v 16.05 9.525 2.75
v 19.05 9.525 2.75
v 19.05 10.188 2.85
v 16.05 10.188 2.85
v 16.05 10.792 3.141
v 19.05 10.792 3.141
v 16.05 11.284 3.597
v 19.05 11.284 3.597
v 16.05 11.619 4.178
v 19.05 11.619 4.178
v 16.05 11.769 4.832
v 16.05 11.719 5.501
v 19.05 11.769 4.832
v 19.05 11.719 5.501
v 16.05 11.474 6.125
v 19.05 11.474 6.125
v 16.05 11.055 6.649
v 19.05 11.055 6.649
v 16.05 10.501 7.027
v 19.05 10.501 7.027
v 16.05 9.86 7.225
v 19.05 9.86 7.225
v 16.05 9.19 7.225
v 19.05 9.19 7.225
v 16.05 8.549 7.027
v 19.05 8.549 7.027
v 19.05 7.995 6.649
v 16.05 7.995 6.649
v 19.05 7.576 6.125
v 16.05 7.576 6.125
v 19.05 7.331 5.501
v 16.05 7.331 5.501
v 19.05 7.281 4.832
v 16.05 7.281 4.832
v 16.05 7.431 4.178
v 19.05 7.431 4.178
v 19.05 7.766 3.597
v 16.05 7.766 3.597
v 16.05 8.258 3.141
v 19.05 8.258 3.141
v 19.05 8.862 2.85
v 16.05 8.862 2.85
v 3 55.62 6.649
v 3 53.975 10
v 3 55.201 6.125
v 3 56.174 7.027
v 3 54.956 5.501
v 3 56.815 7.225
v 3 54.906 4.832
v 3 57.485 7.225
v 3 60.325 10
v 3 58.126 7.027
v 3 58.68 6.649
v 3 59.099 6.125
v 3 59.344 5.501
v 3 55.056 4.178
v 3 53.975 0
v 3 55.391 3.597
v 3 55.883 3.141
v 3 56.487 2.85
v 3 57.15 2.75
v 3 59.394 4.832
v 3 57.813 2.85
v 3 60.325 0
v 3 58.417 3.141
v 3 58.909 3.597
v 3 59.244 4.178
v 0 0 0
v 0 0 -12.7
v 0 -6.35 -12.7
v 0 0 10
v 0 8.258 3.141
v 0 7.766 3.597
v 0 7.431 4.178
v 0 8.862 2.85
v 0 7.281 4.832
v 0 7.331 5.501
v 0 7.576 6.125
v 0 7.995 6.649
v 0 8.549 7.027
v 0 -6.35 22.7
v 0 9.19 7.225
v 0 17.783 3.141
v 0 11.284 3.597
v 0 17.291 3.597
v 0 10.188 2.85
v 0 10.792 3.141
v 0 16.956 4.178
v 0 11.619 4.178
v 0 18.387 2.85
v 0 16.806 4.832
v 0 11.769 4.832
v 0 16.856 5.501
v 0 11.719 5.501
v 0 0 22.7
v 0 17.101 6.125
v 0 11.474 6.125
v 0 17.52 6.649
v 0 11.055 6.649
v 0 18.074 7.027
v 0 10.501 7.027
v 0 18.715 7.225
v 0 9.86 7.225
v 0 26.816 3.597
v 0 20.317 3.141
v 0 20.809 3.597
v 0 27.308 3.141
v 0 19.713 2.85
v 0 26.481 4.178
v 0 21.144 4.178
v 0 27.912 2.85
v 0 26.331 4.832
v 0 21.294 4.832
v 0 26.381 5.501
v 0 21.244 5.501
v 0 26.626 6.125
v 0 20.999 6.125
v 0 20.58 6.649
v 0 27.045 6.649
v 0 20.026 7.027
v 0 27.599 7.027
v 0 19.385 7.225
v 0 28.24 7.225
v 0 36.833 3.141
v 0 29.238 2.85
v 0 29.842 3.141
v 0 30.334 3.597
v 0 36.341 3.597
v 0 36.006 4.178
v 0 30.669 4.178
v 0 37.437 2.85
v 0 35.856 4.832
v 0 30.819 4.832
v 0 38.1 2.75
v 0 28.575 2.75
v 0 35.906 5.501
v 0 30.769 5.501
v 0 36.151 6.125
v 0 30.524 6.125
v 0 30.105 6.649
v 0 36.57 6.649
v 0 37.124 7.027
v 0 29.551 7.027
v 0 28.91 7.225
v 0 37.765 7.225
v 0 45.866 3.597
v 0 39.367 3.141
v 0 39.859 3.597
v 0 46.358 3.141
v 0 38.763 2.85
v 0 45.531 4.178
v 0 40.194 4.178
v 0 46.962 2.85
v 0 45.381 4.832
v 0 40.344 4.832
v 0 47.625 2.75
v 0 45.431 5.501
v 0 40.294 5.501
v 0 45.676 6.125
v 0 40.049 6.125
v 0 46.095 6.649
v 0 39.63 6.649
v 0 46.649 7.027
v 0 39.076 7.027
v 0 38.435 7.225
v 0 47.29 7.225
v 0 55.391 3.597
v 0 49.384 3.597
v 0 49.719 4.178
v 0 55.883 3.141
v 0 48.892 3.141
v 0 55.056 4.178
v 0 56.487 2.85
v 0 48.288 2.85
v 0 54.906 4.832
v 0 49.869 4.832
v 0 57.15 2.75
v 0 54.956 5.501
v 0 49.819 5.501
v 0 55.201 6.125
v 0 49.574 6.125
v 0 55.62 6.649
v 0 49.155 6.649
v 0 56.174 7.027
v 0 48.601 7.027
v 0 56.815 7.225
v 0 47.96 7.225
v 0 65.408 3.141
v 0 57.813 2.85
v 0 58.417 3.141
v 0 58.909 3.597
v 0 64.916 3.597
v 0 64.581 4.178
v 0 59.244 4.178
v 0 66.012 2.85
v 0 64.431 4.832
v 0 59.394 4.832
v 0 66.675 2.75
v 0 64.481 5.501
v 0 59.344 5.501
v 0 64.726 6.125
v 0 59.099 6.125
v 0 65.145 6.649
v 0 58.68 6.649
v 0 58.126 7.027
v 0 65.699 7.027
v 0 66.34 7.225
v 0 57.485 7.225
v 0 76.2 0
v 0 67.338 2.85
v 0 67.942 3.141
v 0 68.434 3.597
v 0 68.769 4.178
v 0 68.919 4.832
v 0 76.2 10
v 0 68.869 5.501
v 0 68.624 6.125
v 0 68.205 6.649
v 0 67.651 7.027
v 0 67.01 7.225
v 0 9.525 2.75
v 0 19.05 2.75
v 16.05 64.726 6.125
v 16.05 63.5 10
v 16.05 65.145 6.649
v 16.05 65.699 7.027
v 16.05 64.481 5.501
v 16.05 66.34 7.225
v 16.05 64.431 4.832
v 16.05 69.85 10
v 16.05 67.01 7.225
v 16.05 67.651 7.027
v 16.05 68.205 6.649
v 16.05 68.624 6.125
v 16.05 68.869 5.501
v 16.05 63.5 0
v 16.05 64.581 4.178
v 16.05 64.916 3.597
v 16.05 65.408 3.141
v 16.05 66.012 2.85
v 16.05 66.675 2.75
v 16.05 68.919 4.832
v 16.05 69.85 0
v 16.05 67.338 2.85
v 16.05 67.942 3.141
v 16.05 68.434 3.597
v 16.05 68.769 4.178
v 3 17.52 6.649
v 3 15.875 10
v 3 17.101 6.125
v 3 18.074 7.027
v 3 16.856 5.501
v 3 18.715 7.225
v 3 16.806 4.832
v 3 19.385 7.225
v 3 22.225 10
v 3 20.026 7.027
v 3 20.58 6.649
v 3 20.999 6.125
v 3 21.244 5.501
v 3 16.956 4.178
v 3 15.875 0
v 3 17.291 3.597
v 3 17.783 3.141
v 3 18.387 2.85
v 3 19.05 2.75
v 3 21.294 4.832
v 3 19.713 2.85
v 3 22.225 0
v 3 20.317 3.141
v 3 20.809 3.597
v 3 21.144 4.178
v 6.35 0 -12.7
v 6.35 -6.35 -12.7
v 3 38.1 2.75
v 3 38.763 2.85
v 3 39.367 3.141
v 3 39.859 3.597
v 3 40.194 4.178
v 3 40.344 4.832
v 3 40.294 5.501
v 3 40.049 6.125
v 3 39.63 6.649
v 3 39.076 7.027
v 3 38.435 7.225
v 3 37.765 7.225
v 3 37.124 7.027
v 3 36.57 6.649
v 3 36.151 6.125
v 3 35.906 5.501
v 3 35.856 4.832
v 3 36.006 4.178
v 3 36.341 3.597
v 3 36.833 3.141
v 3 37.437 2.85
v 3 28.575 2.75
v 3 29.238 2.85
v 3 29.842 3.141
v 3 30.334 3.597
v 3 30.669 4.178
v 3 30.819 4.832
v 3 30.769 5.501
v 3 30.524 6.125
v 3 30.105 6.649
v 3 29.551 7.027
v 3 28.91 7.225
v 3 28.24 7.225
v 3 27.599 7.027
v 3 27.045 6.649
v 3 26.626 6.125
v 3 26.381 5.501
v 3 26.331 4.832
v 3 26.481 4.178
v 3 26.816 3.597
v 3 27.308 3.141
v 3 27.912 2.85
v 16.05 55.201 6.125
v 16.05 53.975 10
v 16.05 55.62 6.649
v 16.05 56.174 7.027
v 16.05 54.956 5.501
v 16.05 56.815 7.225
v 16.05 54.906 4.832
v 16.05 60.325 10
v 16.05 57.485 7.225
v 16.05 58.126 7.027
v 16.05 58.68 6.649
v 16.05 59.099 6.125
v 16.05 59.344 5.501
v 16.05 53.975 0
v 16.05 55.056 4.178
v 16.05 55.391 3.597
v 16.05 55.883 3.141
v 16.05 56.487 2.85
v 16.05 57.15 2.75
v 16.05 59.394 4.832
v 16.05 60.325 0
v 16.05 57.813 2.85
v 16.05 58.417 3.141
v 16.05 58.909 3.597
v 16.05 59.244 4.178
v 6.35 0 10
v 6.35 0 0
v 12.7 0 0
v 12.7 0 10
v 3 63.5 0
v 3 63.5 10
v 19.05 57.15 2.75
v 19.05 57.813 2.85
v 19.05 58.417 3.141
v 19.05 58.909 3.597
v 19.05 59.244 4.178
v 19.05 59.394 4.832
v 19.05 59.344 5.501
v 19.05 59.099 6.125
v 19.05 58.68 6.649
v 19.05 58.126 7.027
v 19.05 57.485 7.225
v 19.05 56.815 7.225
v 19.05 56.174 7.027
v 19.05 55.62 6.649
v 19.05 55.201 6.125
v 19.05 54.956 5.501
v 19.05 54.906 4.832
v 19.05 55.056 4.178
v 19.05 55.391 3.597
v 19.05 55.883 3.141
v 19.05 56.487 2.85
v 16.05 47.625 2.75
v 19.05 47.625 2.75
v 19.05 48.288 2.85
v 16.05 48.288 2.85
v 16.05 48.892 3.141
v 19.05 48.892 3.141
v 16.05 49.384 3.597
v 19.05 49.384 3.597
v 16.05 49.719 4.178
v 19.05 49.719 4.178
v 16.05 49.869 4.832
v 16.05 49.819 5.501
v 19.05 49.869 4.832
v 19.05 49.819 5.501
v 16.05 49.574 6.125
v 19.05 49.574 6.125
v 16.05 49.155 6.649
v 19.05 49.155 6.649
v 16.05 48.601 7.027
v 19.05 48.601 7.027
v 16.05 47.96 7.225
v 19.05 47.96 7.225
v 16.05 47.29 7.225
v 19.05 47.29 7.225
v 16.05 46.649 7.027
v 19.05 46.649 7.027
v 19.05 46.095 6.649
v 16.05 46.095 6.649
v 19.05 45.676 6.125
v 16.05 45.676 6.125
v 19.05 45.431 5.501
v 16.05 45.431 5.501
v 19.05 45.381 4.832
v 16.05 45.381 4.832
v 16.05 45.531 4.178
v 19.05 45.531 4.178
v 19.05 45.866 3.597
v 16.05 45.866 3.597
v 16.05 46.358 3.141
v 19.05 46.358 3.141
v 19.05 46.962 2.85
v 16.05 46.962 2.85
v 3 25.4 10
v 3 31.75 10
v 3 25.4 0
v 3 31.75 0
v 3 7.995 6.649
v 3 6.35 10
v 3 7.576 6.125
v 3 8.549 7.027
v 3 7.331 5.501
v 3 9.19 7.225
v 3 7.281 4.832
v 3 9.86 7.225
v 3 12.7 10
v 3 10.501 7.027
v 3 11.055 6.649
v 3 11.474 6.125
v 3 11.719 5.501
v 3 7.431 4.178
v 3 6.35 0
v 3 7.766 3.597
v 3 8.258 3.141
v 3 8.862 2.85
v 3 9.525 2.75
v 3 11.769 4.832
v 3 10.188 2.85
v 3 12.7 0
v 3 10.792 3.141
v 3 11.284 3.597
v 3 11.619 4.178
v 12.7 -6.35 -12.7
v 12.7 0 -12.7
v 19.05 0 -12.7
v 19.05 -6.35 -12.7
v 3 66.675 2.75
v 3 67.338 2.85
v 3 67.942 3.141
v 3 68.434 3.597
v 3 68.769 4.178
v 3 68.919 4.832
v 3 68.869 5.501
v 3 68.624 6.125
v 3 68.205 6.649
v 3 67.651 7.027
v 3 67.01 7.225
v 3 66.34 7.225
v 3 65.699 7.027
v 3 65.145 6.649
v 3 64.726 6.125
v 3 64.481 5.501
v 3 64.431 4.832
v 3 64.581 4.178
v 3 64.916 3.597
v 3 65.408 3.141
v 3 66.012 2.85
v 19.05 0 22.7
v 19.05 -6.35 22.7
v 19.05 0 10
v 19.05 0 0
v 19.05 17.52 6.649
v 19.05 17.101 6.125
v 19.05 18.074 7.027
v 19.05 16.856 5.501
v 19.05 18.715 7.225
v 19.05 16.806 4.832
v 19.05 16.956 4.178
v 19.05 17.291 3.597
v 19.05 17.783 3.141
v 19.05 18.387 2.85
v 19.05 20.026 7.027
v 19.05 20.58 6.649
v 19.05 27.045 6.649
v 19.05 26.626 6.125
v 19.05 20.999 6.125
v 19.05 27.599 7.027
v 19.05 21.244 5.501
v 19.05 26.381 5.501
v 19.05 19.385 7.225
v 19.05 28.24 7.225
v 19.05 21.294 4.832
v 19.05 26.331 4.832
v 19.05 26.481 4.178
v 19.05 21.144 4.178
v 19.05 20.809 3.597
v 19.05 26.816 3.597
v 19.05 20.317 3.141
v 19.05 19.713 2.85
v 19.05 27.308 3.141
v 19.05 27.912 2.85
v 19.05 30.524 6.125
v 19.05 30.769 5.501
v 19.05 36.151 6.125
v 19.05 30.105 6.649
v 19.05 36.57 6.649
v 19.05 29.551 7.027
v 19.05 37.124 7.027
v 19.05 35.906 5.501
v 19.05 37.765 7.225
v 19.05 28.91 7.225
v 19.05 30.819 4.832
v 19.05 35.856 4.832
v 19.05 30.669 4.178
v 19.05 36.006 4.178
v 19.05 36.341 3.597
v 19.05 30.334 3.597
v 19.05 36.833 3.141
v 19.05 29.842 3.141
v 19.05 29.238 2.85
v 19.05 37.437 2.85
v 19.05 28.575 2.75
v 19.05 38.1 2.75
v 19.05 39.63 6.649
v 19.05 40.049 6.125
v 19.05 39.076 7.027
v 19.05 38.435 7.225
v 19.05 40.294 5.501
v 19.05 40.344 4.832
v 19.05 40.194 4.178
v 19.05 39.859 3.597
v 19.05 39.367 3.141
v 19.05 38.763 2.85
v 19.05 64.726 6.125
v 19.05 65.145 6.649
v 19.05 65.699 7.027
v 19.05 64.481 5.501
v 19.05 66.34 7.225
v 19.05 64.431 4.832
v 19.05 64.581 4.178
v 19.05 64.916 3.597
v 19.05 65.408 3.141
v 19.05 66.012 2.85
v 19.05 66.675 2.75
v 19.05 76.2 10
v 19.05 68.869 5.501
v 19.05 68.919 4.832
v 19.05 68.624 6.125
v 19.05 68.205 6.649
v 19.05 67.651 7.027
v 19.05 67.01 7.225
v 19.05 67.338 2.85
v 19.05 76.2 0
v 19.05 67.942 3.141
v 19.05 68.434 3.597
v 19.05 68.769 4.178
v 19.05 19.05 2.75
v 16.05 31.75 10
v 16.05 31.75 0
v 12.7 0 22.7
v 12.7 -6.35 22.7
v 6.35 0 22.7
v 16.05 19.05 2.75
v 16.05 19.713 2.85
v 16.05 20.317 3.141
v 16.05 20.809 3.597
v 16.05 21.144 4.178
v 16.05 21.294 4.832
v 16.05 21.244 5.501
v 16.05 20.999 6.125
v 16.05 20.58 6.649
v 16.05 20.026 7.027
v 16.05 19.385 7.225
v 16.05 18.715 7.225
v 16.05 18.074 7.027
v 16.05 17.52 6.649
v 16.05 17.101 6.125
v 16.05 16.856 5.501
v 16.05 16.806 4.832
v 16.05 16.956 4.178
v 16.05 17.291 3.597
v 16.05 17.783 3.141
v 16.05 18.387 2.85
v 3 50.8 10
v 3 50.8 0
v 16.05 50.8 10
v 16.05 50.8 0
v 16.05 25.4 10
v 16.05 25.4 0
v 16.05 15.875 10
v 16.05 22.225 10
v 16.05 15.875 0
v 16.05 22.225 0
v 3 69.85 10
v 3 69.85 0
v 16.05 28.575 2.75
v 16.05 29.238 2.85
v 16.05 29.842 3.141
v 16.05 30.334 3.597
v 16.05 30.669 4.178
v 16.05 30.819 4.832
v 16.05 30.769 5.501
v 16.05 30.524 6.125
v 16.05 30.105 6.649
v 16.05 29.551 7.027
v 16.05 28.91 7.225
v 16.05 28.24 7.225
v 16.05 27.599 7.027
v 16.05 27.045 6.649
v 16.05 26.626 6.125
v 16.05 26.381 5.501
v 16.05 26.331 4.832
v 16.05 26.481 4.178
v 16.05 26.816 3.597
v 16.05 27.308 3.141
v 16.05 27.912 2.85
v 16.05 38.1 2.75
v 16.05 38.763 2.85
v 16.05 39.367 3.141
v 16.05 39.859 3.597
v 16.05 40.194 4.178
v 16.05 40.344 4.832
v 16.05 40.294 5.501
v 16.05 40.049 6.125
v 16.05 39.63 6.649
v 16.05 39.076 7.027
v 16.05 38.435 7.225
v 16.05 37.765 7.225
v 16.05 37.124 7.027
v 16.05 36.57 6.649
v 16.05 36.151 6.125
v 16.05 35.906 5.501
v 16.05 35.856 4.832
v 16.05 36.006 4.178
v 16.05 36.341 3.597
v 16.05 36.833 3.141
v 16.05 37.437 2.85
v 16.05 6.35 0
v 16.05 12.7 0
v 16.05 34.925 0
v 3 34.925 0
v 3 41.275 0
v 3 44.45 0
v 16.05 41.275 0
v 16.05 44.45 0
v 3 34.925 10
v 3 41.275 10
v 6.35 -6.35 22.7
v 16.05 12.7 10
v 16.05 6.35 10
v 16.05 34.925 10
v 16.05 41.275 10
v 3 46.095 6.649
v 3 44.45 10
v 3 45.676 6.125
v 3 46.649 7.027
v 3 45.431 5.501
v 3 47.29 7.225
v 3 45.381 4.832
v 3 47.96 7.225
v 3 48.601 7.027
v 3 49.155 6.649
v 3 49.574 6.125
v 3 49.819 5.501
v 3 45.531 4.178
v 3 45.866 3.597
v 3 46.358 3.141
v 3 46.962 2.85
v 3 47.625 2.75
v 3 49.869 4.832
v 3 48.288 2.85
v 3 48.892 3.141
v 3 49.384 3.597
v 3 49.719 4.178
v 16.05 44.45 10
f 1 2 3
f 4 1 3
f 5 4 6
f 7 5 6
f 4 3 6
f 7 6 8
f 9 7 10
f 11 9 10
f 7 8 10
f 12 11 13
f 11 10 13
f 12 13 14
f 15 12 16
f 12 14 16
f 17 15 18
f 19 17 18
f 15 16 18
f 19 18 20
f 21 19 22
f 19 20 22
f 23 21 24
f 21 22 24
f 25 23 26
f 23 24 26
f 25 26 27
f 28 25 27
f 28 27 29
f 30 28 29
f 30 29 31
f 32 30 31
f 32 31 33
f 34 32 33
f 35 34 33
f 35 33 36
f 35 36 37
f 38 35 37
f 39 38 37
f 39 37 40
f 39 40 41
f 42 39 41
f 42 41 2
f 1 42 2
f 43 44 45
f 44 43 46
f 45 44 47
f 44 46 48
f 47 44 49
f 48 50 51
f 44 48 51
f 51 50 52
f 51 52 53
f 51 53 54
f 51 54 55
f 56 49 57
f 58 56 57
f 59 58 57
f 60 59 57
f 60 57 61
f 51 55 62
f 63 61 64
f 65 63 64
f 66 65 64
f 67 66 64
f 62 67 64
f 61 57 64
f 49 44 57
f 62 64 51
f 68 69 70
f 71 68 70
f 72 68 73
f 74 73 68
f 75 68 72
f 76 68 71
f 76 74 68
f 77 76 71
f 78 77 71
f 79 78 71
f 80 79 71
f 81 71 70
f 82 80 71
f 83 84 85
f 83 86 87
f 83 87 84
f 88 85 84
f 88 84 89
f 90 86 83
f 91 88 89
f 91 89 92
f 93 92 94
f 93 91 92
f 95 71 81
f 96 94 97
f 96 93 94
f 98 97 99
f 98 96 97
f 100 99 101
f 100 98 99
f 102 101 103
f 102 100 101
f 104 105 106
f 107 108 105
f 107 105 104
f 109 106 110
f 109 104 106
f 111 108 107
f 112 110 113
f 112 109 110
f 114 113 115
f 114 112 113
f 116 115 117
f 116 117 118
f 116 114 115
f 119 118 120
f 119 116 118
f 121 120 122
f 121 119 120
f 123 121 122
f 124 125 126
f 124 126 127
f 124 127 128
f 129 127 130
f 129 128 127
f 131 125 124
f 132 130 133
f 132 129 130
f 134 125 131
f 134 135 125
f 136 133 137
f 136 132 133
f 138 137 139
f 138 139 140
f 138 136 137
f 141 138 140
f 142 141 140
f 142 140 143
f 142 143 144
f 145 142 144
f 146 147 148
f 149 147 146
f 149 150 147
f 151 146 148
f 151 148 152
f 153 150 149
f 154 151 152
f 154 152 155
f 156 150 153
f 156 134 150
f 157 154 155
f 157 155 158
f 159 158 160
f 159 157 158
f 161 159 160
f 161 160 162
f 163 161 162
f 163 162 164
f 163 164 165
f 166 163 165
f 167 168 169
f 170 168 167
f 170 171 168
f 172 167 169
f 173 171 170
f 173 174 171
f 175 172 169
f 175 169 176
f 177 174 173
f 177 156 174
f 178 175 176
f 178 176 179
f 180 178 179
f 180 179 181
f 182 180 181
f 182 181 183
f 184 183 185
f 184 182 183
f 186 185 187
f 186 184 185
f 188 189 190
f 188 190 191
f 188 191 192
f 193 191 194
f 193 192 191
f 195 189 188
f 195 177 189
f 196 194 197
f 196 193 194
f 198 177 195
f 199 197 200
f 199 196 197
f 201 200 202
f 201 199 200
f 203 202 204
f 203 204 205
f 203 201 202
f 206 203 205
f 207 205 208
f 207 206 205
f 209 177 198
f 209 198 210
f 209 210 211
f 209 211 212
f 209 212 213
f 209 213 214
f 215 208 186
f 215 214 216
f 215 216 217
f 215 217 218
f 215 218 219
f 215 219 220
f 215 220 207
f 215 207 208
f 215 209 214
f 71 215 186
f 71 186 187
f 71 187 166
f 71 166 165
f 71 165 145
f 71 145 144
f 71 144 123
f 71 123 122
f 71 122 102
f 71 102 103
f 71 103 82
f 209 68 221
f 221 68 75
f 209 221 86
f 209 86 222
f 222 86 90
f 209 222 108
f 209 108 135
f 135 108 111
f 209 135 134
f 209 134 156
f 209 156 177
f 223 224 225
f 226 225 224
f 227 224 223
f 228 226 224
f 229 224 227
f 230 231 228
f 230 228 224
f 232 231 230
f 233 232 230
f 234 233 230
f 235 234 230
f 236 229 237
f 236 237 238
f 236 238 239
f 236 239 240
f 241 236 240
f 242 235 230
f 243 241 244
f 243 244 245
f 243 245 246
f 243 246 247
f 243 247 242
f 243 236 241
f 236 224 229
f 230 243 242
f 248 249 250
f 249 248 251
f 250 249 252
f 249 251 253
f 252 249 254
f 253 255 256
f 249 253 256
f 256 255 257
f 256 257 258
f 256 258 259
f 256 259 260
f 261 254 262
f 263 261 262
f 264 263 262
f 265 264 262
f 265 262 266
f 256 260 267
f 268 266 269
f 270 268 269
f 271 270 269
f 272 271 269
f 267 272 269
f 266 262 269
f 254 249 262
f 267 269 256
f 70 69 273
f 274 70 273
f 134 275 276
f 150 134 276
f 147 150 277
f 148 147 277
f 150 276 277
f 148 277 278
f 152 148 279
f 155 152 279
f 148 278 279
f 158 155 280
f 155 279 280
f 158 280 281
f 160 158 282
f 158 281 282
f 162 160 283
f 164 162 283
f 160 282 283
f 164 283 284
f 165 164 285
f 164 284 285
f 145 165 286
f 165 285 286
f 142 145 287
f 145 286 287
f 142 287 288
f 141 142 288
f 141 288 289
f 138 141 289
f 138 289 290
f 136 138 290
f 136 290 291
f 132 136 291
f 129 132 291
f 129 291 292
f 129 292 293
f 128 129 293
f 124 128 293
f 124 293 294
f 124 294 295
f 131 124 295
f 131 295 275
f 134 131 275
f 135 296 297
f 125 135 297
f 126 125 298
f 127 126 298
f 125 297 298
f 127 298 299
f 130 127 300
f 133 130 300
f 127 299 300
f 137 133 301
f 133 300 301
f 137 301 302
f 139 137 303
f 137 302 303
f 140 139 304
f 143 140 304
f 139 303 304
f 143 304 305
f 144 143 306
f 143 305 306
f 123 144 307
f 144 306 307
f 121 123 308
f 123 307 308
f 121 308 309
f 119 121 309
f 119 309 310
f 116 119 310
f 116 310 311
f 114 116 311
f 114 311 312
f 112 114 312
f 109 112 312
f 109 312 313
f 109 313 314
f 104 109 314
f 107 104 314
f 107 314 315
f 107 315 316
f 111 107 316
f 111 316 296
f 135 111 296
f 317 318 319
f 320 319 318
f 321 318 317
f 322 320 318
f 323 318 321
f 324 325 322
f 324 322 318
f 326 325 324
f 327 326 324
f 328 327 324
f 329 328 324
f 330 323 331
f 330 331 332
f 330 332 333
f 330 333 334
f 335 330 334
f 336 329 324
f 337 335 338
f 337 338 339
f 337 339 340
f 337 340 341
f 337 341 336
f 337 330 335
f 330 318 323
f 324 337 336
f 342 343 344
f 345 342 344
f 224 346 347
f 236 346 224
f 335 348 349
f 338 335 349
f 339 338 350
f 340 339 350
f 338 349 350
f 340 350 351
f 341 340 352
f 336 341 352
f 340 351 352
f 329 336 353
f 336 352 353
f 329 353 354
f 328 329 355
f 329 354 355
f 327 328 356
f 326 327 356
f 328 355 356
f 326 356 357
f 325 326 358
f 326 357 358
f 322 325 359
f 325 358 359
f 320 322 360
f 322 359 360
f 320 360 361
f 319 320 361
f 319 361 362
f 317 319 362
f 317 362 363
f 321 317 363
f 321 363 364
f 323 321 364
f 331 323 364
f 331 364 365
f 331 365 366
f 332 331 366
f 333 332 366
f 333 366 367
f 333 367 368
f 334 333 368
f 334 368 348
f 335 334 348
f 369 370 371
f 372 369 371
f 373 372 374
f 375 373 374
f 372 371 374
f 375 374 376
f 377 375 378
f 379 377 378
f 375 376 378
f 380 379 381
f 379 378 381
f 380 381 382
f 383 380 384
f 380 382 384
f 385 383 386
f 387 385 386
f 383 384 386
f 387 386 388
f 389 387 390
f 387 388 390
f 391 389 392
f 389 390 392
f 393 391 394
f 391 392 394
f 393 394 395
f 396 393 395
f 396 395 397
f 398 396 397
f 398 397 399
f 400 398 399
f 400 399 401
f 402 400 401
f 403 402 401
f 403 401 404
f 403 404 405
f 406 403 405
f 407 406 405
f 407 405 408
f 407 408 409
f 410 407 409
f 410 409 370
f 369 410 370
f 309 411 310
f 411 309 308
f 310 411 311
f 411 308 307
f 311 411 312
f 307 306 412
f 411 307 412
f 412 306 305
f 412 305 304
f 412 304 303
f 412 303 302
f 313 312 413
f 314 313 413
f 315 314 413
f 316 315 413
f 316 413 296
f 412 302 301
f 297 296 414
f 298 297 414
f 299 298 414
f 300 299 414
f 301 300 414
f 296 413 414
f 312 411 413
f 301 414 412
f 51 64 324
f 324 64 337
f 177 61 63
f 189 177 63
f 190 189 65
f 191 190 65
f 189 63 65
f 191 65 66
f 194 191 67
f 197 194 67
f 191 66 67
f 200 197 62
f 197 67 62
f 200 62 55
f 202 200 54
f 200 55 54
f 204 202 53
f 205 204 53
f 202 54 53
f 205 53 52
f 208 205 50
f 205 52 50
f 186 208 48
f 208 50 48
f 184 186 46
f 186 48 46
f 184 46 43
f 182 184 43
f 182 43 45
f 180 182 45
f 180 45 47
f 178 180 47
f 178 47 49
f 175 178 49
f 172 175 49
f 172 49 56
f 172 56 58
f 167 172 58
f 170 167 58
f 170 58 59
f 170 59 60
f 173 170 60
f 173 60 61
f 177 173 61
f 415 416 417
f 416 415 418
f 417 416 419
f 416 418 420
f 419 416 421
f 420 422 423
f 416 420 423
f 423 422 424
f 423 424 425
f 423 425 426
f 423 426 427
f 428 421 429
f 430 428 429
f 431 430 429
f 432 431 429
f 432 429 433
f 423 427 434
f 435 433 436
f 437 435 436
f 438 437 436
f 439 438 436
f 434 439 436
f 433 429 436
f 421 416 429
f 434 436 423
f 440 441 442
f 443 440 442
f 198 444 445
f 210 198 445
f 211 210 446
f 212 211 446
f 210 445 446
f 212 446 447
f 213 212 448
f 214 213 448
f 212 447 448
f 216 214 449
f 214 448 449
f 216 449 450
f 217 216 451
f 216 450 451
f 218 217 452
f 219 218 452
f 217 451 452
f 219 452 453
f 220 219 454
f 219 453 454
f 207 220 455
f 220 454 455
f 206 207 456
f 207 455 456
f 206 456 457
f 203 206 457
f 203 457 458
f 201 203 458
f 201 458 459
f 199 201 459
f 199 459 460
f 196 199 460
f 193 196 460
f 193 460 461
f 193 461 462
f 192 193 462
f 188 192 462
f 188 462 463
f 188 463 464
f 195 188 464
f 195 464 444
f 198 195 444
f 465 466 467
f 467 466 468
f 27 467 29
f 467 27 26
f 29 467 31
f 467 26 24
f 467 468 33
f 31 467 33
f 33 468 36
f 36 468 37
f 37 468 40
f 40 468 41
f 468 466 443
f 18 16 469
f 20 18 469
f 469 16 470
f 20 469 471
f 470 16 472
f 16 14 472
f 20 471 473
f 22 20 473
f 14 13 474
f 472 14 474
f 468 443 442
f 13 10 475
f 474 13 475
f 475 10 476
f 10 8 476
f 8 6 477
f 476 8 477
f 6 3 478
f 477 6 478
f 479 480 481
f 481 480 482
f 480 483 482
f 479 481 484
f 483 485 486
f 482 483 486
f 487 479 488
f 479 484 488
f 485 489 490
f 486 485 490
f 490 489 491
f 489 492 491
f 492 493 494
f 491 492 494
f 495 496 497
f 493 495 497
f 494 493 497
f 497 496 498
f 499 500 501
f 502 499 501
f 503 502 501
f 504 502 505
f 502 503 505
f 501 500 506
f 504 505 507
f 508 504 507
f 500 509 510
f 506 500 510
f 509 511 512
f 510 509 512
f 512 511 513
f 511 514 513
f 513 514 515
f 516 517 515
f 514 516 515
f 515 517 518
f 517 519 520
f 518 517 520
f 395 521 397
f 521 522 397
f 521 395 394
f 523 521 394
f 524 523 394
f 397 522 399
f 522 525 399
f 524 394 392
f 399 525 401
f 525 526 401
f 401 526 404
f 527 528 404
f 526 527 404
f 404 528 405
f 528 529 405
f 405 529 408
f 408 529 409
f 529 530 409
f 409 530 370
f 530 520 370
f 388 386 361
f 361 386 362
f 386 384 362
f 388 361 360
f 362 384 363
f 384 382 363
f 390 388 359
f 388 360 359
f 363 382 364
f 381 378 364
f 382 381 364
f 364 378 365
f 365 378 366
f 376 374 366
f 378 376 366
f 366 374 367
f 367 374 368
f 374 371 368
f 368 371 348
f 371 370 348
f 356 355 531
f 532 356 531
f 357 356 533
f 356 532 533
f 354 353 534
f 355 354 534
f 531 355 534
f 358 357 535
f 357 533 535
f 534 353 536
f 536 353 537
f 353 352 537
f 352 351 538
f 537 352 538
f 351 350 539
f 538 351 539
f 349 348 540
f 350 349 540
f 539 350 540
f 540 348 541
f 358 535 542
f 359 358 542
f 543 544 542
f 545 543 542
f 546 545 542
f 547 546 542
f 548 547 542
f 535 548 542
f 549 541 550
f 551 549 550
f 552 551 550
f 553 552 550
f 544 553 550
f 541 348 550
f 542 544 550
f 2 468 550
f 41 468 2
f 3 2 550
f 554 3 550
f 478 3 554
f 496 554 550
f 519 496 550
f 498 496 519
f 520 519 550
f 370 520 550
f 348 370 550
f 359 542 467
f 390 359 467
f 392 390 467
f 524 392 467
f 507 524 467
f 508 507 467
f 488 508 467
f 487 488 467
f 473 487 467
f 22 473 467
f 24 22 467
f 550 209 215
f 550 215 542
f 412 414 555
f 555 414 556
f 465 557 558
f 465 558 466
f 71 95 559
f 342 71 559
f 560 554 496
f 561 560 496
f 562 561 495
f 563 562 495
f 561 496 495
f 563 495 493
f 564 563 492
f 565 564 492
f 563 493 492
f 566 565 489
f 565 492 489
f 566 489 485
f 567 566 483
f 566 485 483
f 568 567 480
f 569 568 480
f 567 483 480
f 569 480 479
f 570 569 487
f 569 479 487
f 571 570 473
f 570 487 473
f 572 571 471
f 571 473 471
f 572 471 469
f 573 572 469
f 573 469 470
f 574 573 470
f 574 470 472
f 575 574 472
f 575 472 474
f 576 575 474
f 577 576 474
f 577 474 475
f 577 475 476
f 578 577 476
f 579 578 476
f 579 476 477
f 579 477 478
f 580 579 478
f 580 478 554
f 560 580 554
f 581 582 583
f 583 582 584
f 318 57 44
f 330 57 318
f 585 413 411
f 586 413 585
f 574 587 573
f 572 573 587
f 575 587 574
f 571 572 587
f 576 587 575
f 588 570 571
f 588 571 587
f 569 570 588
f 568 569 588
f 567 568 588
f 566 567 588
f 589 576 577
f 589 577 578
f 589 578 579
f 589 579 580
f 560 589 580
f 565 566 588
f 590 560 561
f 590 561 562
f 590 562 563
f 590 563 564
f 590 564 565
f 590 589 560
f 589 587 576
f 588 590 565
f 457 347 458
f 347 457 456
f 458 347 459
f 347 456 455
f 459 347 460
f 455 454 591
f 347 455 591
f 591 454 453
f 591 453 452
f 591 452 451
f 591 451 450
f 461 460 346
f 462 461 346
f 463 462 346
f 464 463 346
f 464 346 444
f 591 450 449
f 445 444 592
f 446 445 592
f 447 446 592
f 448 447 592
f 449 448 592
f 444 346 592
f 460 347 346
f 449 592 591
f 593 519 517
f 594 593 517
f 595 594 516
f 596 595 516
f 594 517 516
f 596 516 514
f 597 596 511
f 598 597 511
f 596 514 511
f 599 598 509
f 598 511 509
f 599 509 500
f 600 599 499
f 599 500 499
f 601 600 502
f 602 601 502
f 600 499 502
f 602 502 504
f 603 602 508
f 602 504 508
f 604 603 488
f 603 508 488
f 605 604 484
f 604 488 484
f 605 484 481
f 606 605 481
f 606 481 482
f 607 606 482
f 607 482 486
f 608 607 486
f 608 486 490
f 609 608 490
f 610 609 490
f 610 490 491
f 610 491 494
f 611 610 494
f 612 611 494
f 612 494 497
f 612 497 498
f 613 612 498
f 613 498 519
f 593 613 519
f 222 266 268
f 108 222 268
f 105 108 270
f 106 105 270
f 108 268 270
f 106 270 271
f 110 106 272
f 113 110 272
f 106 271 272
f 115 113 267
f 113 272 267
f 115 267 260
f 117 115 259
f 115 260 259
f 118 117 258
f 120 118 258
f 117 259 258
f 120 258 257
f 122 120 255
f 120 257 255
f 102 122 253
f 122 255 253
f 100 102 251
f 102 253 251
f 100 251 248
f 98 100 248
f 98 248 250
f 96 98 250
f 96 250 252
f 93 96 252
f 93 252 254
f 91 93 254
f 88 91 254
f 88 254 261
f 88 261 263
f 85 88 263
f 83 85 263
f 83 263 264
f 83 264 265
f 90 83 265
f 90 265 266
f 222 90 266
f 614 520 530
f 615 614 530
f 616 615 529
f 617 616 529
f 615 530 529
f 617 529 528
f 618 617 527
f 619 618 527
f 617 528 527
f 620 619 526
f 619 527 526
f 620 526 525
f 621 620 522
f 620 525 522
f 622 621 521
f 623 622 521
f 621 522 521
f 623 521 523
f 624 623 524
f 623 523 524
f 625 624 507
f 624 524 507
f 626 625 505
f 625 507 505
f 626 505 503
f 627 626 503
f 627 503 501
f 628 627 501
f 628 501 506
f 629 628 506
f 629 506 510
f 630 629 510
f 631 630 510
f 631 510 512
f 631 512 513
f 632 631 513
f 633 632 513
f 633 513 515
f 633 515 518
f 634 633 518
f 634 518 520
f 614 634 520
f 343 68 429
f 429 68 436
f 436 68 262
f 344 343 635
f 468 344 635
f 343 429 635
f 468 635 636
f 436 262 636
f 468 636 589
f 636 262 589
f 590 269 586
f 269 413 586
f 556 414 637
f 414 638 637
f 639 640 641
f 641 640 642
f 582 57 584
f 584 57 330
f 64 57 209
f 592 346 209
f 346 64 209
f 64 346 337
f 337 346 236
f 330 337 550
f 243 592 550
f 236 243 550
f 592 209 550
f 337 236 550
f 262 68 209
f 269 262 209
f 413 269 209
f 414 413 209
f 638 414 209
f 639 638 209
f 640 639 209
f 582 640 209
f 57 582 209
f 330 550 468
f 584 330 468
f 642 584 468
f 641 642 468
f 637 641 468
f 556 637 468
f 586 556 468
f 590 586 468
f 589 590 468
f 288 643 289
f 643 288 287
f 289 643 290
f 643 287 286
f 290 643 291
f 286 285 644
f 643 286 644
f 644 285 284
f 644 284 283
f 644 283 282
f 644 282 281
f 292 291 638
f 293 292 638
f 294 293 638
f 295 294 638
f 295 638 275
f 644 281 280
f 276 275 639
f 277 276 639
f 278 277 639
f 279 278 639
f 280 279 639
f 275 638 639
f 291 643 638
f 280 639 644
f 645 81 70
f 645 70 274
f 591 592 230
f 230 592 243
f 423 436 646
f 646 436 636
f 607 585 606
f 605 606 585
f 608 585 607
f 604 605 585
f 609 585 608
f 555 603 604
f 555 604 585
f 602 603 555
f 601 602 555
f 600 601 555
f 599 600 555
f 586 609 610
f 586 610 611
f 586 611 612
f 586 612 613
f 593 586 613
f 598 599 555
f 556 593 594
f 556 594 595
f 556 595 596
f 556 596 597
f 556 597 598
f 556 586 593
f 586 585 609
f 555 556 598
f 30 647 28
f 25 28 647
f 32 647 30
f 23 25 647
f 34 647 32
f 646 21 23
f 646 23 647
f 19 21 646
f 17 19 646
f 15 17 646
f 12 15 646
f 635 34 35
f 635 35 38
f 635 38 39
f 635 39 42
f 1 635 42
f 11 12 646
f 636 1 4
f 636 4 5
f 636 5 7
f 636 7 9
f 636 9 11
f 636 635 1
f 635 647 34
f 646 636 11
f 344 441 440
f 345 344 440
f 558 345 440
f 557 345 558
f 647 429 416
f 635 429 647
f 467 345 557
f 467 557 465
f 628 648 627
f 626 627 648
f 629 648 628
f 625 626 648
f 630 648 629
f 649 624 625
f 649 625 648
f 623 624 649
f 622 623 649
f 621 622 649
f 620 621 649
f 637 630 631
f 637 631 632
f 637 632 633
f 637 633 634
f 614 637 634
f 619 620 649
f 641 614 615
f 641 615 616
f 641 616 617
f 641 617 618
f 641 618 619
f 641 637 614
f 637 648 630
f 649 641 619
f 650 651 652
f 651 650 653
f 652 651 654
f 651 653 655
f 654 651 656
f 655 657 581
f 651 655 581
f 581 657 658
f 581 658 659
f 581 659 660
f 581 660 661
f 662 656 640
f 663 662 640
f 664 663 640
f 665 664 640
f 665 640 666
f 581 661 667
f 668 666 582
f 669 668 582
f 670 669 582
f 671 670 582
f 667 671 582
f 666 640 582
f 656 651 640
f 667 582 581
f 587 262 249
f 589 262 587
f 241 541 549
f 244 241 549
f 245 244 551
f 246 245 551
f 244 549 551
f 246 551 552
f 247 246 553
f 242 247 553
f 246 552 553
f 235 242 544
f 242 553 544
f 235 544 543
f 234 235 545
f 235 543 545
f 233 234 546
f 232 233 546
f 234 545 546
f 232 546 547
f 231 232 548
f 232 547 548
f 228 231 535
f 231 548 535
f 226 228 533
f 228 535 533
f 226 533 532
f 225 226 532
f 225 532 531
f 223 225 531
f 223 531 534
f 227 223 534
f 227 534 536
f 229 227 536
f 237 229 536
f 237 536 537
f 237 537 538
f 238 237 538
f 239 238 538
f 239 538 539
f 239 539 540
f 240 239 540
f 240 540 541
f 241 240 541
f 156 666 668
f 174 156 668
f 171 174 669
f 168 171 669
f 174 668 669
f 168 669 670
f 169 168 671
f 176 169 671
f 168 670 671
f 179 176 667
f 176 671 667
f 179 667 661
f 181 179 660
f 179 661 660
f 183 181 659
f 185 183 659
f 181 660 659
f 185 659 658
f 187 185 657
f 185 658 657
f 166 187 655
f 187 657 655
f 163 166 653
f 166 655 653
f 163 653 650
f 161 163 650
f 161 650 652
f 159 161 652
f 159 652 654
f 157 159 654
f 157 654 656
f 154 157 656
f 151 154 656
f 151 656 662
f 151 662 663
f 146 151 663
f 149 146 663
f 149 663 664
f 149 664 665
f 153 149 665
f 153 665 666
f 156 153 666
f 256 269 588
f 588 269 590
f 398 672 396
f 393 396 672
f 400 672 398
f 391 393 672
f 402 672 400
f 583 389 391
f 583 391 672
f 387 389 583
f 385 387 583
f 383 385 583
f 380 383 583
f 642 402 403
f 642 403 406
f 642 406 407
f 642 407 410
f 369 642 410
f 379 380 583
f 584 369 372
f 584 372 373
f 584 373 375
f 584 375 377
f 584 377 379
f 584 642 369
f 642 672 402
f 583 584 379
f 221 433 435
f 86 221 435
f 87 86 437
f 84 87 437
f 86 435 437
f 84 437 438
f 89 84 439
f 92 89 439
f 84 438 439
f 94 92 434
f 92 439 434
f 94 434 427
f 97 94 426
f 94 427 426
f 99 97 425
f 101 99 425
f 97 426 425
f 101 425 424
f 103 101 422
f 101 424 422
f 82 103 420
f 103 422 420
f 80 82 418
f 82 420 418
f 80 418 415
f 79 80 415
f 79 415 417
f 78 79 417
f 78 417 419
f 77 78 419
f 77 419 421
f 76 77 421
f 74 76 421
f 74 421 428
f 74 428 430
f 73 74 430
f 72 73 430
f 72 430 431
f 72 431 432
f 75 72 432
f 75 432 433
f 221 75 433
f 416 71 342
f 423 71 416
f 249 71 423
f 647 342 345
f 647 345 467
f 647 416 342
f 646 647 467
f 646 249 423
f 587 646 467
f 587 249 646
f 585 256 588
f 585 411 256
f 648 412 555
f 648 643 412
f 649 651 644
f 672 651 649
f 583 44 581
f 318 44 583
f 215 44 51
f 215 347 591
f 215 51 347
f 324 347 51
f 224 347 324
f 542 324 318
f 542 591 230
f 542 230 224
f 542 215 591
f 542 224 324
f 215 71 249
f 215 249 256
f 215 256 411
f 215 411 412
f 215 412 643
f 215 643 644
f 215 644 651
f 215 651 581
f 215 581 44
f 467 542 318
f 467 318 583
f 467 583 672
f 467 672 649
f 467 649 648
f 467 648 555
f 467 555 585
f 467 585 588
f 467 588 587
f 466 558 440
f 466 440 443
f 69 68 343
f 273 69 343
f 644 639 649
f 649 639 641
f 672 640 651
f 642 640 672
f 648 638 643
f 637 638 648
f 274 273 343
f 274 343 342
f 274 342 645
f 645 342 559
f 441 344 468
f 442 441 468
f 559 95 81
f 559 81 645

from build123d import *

# Parameters (mm, degrees)
SKETCH1_W           = 19.05
SKETCH1_H           = 76.2
SKETCH1_W_2         = 13.05
SKETCH1_H_2         = 6.35
BOSS_EXTRUDE1_DEPTH = 10
SKETCH2_W           = 6.35
SKETCH2_H           = 35.4
BOSS_EXTRUDE2_DEPTH = 6.35
SKETCH3_R           = 2.25
CUT_EXTRUDE1_DEPTH  = 30


with BuildPart() as part:
    # Sketch1 → Boss-Extrude1 (new body)
    with BuildSketch(Plane.XY):
        with Locations((9.525, 38.1)):
            Rectangle(SKETCH1_W, SKETCH1_H)
        with Locations((9.525, 66.675)):
            Rectangle(SKETCH1_W_2, SKETCH1_H_2, mode=Mode.SUBTRACT)
        with Locations((9.525, 57.15)):
            Rectangle(SKETCH1_W_2, SKETCH1_H_2, mode=Mode.SUBTRACT)
        with Locations((9.525, 47.625)):
            Rectangle(SKETCH1_W_2, SKETCH1_H_2, mode=Mode.SUBTRACT)
        with Locations((9.525, 38.1)):
            Rectangle(SKETCH1_W_2, SKETCH1_H_2, mode=Mode.SUBTRACT)
        with Locations((9.525, 28.575)):
            Rectangle(SKETCH1_W_2, SKETCH1_H_2, mode=Mode.SUBTRACT)
        with Locations((9.525, 19.05)):
            Rectangle(SKETCH1_W_2, SKETCH1_H_2, mode=Mode.SUBTRACT)
        with Locations((9.525, 9.525)):
            Rectangle(SKETCH1_W_2, SKETCH1_H_2, mode=Mode.SUBTRACT)
    extrude(amount=BOSS_EXTRUDE1_DEPTH)

    # Sketch2 → Boss-Extrude2 (add)
    with BuildSketch(Plane.XZ):
        with Locations((3.175, 5)):
            Rectangle(SKETCH2_W, SKETCH2_H)
        with Locations((15.875, 5)):
            Rectangle(SKETCH2_W, SKETCH2_H)
    extrude(amount=BOSS_EXTRUDE2_DEPTH)

    # Sketch3 → Cut-Extrude1 (cut)
    with BuildSketch(Plane(origin=(19.05, 0, 0), x_dir=(0, 0, -1), z_dir=(1, 0, 0))):
        with Locations((-5, 66.675)):
            Circle(SKETCH3_R)
        with Locations((-5, 57.15)):
            Circle(SKETCH3_R)
        with Locations((-5, 47.625)):
            Circle(SKETCH3_R)
        with Locations((-5, 38.1)):
            Circle(SKETCH3_R)
        with Locations((-5, 28.575)):
            Circle(SKETCH3_R)
        with Locations((-5, 19.05)):
            Circle(SKETCH3_R)
        with Locations((-5, 9.525)):
            Circle(SKETCH3_R)
    extrude(amount=-CUT_EXTRUDE1_DEPTH, mode=Mode.SUBTRACT)


solid = part.part
